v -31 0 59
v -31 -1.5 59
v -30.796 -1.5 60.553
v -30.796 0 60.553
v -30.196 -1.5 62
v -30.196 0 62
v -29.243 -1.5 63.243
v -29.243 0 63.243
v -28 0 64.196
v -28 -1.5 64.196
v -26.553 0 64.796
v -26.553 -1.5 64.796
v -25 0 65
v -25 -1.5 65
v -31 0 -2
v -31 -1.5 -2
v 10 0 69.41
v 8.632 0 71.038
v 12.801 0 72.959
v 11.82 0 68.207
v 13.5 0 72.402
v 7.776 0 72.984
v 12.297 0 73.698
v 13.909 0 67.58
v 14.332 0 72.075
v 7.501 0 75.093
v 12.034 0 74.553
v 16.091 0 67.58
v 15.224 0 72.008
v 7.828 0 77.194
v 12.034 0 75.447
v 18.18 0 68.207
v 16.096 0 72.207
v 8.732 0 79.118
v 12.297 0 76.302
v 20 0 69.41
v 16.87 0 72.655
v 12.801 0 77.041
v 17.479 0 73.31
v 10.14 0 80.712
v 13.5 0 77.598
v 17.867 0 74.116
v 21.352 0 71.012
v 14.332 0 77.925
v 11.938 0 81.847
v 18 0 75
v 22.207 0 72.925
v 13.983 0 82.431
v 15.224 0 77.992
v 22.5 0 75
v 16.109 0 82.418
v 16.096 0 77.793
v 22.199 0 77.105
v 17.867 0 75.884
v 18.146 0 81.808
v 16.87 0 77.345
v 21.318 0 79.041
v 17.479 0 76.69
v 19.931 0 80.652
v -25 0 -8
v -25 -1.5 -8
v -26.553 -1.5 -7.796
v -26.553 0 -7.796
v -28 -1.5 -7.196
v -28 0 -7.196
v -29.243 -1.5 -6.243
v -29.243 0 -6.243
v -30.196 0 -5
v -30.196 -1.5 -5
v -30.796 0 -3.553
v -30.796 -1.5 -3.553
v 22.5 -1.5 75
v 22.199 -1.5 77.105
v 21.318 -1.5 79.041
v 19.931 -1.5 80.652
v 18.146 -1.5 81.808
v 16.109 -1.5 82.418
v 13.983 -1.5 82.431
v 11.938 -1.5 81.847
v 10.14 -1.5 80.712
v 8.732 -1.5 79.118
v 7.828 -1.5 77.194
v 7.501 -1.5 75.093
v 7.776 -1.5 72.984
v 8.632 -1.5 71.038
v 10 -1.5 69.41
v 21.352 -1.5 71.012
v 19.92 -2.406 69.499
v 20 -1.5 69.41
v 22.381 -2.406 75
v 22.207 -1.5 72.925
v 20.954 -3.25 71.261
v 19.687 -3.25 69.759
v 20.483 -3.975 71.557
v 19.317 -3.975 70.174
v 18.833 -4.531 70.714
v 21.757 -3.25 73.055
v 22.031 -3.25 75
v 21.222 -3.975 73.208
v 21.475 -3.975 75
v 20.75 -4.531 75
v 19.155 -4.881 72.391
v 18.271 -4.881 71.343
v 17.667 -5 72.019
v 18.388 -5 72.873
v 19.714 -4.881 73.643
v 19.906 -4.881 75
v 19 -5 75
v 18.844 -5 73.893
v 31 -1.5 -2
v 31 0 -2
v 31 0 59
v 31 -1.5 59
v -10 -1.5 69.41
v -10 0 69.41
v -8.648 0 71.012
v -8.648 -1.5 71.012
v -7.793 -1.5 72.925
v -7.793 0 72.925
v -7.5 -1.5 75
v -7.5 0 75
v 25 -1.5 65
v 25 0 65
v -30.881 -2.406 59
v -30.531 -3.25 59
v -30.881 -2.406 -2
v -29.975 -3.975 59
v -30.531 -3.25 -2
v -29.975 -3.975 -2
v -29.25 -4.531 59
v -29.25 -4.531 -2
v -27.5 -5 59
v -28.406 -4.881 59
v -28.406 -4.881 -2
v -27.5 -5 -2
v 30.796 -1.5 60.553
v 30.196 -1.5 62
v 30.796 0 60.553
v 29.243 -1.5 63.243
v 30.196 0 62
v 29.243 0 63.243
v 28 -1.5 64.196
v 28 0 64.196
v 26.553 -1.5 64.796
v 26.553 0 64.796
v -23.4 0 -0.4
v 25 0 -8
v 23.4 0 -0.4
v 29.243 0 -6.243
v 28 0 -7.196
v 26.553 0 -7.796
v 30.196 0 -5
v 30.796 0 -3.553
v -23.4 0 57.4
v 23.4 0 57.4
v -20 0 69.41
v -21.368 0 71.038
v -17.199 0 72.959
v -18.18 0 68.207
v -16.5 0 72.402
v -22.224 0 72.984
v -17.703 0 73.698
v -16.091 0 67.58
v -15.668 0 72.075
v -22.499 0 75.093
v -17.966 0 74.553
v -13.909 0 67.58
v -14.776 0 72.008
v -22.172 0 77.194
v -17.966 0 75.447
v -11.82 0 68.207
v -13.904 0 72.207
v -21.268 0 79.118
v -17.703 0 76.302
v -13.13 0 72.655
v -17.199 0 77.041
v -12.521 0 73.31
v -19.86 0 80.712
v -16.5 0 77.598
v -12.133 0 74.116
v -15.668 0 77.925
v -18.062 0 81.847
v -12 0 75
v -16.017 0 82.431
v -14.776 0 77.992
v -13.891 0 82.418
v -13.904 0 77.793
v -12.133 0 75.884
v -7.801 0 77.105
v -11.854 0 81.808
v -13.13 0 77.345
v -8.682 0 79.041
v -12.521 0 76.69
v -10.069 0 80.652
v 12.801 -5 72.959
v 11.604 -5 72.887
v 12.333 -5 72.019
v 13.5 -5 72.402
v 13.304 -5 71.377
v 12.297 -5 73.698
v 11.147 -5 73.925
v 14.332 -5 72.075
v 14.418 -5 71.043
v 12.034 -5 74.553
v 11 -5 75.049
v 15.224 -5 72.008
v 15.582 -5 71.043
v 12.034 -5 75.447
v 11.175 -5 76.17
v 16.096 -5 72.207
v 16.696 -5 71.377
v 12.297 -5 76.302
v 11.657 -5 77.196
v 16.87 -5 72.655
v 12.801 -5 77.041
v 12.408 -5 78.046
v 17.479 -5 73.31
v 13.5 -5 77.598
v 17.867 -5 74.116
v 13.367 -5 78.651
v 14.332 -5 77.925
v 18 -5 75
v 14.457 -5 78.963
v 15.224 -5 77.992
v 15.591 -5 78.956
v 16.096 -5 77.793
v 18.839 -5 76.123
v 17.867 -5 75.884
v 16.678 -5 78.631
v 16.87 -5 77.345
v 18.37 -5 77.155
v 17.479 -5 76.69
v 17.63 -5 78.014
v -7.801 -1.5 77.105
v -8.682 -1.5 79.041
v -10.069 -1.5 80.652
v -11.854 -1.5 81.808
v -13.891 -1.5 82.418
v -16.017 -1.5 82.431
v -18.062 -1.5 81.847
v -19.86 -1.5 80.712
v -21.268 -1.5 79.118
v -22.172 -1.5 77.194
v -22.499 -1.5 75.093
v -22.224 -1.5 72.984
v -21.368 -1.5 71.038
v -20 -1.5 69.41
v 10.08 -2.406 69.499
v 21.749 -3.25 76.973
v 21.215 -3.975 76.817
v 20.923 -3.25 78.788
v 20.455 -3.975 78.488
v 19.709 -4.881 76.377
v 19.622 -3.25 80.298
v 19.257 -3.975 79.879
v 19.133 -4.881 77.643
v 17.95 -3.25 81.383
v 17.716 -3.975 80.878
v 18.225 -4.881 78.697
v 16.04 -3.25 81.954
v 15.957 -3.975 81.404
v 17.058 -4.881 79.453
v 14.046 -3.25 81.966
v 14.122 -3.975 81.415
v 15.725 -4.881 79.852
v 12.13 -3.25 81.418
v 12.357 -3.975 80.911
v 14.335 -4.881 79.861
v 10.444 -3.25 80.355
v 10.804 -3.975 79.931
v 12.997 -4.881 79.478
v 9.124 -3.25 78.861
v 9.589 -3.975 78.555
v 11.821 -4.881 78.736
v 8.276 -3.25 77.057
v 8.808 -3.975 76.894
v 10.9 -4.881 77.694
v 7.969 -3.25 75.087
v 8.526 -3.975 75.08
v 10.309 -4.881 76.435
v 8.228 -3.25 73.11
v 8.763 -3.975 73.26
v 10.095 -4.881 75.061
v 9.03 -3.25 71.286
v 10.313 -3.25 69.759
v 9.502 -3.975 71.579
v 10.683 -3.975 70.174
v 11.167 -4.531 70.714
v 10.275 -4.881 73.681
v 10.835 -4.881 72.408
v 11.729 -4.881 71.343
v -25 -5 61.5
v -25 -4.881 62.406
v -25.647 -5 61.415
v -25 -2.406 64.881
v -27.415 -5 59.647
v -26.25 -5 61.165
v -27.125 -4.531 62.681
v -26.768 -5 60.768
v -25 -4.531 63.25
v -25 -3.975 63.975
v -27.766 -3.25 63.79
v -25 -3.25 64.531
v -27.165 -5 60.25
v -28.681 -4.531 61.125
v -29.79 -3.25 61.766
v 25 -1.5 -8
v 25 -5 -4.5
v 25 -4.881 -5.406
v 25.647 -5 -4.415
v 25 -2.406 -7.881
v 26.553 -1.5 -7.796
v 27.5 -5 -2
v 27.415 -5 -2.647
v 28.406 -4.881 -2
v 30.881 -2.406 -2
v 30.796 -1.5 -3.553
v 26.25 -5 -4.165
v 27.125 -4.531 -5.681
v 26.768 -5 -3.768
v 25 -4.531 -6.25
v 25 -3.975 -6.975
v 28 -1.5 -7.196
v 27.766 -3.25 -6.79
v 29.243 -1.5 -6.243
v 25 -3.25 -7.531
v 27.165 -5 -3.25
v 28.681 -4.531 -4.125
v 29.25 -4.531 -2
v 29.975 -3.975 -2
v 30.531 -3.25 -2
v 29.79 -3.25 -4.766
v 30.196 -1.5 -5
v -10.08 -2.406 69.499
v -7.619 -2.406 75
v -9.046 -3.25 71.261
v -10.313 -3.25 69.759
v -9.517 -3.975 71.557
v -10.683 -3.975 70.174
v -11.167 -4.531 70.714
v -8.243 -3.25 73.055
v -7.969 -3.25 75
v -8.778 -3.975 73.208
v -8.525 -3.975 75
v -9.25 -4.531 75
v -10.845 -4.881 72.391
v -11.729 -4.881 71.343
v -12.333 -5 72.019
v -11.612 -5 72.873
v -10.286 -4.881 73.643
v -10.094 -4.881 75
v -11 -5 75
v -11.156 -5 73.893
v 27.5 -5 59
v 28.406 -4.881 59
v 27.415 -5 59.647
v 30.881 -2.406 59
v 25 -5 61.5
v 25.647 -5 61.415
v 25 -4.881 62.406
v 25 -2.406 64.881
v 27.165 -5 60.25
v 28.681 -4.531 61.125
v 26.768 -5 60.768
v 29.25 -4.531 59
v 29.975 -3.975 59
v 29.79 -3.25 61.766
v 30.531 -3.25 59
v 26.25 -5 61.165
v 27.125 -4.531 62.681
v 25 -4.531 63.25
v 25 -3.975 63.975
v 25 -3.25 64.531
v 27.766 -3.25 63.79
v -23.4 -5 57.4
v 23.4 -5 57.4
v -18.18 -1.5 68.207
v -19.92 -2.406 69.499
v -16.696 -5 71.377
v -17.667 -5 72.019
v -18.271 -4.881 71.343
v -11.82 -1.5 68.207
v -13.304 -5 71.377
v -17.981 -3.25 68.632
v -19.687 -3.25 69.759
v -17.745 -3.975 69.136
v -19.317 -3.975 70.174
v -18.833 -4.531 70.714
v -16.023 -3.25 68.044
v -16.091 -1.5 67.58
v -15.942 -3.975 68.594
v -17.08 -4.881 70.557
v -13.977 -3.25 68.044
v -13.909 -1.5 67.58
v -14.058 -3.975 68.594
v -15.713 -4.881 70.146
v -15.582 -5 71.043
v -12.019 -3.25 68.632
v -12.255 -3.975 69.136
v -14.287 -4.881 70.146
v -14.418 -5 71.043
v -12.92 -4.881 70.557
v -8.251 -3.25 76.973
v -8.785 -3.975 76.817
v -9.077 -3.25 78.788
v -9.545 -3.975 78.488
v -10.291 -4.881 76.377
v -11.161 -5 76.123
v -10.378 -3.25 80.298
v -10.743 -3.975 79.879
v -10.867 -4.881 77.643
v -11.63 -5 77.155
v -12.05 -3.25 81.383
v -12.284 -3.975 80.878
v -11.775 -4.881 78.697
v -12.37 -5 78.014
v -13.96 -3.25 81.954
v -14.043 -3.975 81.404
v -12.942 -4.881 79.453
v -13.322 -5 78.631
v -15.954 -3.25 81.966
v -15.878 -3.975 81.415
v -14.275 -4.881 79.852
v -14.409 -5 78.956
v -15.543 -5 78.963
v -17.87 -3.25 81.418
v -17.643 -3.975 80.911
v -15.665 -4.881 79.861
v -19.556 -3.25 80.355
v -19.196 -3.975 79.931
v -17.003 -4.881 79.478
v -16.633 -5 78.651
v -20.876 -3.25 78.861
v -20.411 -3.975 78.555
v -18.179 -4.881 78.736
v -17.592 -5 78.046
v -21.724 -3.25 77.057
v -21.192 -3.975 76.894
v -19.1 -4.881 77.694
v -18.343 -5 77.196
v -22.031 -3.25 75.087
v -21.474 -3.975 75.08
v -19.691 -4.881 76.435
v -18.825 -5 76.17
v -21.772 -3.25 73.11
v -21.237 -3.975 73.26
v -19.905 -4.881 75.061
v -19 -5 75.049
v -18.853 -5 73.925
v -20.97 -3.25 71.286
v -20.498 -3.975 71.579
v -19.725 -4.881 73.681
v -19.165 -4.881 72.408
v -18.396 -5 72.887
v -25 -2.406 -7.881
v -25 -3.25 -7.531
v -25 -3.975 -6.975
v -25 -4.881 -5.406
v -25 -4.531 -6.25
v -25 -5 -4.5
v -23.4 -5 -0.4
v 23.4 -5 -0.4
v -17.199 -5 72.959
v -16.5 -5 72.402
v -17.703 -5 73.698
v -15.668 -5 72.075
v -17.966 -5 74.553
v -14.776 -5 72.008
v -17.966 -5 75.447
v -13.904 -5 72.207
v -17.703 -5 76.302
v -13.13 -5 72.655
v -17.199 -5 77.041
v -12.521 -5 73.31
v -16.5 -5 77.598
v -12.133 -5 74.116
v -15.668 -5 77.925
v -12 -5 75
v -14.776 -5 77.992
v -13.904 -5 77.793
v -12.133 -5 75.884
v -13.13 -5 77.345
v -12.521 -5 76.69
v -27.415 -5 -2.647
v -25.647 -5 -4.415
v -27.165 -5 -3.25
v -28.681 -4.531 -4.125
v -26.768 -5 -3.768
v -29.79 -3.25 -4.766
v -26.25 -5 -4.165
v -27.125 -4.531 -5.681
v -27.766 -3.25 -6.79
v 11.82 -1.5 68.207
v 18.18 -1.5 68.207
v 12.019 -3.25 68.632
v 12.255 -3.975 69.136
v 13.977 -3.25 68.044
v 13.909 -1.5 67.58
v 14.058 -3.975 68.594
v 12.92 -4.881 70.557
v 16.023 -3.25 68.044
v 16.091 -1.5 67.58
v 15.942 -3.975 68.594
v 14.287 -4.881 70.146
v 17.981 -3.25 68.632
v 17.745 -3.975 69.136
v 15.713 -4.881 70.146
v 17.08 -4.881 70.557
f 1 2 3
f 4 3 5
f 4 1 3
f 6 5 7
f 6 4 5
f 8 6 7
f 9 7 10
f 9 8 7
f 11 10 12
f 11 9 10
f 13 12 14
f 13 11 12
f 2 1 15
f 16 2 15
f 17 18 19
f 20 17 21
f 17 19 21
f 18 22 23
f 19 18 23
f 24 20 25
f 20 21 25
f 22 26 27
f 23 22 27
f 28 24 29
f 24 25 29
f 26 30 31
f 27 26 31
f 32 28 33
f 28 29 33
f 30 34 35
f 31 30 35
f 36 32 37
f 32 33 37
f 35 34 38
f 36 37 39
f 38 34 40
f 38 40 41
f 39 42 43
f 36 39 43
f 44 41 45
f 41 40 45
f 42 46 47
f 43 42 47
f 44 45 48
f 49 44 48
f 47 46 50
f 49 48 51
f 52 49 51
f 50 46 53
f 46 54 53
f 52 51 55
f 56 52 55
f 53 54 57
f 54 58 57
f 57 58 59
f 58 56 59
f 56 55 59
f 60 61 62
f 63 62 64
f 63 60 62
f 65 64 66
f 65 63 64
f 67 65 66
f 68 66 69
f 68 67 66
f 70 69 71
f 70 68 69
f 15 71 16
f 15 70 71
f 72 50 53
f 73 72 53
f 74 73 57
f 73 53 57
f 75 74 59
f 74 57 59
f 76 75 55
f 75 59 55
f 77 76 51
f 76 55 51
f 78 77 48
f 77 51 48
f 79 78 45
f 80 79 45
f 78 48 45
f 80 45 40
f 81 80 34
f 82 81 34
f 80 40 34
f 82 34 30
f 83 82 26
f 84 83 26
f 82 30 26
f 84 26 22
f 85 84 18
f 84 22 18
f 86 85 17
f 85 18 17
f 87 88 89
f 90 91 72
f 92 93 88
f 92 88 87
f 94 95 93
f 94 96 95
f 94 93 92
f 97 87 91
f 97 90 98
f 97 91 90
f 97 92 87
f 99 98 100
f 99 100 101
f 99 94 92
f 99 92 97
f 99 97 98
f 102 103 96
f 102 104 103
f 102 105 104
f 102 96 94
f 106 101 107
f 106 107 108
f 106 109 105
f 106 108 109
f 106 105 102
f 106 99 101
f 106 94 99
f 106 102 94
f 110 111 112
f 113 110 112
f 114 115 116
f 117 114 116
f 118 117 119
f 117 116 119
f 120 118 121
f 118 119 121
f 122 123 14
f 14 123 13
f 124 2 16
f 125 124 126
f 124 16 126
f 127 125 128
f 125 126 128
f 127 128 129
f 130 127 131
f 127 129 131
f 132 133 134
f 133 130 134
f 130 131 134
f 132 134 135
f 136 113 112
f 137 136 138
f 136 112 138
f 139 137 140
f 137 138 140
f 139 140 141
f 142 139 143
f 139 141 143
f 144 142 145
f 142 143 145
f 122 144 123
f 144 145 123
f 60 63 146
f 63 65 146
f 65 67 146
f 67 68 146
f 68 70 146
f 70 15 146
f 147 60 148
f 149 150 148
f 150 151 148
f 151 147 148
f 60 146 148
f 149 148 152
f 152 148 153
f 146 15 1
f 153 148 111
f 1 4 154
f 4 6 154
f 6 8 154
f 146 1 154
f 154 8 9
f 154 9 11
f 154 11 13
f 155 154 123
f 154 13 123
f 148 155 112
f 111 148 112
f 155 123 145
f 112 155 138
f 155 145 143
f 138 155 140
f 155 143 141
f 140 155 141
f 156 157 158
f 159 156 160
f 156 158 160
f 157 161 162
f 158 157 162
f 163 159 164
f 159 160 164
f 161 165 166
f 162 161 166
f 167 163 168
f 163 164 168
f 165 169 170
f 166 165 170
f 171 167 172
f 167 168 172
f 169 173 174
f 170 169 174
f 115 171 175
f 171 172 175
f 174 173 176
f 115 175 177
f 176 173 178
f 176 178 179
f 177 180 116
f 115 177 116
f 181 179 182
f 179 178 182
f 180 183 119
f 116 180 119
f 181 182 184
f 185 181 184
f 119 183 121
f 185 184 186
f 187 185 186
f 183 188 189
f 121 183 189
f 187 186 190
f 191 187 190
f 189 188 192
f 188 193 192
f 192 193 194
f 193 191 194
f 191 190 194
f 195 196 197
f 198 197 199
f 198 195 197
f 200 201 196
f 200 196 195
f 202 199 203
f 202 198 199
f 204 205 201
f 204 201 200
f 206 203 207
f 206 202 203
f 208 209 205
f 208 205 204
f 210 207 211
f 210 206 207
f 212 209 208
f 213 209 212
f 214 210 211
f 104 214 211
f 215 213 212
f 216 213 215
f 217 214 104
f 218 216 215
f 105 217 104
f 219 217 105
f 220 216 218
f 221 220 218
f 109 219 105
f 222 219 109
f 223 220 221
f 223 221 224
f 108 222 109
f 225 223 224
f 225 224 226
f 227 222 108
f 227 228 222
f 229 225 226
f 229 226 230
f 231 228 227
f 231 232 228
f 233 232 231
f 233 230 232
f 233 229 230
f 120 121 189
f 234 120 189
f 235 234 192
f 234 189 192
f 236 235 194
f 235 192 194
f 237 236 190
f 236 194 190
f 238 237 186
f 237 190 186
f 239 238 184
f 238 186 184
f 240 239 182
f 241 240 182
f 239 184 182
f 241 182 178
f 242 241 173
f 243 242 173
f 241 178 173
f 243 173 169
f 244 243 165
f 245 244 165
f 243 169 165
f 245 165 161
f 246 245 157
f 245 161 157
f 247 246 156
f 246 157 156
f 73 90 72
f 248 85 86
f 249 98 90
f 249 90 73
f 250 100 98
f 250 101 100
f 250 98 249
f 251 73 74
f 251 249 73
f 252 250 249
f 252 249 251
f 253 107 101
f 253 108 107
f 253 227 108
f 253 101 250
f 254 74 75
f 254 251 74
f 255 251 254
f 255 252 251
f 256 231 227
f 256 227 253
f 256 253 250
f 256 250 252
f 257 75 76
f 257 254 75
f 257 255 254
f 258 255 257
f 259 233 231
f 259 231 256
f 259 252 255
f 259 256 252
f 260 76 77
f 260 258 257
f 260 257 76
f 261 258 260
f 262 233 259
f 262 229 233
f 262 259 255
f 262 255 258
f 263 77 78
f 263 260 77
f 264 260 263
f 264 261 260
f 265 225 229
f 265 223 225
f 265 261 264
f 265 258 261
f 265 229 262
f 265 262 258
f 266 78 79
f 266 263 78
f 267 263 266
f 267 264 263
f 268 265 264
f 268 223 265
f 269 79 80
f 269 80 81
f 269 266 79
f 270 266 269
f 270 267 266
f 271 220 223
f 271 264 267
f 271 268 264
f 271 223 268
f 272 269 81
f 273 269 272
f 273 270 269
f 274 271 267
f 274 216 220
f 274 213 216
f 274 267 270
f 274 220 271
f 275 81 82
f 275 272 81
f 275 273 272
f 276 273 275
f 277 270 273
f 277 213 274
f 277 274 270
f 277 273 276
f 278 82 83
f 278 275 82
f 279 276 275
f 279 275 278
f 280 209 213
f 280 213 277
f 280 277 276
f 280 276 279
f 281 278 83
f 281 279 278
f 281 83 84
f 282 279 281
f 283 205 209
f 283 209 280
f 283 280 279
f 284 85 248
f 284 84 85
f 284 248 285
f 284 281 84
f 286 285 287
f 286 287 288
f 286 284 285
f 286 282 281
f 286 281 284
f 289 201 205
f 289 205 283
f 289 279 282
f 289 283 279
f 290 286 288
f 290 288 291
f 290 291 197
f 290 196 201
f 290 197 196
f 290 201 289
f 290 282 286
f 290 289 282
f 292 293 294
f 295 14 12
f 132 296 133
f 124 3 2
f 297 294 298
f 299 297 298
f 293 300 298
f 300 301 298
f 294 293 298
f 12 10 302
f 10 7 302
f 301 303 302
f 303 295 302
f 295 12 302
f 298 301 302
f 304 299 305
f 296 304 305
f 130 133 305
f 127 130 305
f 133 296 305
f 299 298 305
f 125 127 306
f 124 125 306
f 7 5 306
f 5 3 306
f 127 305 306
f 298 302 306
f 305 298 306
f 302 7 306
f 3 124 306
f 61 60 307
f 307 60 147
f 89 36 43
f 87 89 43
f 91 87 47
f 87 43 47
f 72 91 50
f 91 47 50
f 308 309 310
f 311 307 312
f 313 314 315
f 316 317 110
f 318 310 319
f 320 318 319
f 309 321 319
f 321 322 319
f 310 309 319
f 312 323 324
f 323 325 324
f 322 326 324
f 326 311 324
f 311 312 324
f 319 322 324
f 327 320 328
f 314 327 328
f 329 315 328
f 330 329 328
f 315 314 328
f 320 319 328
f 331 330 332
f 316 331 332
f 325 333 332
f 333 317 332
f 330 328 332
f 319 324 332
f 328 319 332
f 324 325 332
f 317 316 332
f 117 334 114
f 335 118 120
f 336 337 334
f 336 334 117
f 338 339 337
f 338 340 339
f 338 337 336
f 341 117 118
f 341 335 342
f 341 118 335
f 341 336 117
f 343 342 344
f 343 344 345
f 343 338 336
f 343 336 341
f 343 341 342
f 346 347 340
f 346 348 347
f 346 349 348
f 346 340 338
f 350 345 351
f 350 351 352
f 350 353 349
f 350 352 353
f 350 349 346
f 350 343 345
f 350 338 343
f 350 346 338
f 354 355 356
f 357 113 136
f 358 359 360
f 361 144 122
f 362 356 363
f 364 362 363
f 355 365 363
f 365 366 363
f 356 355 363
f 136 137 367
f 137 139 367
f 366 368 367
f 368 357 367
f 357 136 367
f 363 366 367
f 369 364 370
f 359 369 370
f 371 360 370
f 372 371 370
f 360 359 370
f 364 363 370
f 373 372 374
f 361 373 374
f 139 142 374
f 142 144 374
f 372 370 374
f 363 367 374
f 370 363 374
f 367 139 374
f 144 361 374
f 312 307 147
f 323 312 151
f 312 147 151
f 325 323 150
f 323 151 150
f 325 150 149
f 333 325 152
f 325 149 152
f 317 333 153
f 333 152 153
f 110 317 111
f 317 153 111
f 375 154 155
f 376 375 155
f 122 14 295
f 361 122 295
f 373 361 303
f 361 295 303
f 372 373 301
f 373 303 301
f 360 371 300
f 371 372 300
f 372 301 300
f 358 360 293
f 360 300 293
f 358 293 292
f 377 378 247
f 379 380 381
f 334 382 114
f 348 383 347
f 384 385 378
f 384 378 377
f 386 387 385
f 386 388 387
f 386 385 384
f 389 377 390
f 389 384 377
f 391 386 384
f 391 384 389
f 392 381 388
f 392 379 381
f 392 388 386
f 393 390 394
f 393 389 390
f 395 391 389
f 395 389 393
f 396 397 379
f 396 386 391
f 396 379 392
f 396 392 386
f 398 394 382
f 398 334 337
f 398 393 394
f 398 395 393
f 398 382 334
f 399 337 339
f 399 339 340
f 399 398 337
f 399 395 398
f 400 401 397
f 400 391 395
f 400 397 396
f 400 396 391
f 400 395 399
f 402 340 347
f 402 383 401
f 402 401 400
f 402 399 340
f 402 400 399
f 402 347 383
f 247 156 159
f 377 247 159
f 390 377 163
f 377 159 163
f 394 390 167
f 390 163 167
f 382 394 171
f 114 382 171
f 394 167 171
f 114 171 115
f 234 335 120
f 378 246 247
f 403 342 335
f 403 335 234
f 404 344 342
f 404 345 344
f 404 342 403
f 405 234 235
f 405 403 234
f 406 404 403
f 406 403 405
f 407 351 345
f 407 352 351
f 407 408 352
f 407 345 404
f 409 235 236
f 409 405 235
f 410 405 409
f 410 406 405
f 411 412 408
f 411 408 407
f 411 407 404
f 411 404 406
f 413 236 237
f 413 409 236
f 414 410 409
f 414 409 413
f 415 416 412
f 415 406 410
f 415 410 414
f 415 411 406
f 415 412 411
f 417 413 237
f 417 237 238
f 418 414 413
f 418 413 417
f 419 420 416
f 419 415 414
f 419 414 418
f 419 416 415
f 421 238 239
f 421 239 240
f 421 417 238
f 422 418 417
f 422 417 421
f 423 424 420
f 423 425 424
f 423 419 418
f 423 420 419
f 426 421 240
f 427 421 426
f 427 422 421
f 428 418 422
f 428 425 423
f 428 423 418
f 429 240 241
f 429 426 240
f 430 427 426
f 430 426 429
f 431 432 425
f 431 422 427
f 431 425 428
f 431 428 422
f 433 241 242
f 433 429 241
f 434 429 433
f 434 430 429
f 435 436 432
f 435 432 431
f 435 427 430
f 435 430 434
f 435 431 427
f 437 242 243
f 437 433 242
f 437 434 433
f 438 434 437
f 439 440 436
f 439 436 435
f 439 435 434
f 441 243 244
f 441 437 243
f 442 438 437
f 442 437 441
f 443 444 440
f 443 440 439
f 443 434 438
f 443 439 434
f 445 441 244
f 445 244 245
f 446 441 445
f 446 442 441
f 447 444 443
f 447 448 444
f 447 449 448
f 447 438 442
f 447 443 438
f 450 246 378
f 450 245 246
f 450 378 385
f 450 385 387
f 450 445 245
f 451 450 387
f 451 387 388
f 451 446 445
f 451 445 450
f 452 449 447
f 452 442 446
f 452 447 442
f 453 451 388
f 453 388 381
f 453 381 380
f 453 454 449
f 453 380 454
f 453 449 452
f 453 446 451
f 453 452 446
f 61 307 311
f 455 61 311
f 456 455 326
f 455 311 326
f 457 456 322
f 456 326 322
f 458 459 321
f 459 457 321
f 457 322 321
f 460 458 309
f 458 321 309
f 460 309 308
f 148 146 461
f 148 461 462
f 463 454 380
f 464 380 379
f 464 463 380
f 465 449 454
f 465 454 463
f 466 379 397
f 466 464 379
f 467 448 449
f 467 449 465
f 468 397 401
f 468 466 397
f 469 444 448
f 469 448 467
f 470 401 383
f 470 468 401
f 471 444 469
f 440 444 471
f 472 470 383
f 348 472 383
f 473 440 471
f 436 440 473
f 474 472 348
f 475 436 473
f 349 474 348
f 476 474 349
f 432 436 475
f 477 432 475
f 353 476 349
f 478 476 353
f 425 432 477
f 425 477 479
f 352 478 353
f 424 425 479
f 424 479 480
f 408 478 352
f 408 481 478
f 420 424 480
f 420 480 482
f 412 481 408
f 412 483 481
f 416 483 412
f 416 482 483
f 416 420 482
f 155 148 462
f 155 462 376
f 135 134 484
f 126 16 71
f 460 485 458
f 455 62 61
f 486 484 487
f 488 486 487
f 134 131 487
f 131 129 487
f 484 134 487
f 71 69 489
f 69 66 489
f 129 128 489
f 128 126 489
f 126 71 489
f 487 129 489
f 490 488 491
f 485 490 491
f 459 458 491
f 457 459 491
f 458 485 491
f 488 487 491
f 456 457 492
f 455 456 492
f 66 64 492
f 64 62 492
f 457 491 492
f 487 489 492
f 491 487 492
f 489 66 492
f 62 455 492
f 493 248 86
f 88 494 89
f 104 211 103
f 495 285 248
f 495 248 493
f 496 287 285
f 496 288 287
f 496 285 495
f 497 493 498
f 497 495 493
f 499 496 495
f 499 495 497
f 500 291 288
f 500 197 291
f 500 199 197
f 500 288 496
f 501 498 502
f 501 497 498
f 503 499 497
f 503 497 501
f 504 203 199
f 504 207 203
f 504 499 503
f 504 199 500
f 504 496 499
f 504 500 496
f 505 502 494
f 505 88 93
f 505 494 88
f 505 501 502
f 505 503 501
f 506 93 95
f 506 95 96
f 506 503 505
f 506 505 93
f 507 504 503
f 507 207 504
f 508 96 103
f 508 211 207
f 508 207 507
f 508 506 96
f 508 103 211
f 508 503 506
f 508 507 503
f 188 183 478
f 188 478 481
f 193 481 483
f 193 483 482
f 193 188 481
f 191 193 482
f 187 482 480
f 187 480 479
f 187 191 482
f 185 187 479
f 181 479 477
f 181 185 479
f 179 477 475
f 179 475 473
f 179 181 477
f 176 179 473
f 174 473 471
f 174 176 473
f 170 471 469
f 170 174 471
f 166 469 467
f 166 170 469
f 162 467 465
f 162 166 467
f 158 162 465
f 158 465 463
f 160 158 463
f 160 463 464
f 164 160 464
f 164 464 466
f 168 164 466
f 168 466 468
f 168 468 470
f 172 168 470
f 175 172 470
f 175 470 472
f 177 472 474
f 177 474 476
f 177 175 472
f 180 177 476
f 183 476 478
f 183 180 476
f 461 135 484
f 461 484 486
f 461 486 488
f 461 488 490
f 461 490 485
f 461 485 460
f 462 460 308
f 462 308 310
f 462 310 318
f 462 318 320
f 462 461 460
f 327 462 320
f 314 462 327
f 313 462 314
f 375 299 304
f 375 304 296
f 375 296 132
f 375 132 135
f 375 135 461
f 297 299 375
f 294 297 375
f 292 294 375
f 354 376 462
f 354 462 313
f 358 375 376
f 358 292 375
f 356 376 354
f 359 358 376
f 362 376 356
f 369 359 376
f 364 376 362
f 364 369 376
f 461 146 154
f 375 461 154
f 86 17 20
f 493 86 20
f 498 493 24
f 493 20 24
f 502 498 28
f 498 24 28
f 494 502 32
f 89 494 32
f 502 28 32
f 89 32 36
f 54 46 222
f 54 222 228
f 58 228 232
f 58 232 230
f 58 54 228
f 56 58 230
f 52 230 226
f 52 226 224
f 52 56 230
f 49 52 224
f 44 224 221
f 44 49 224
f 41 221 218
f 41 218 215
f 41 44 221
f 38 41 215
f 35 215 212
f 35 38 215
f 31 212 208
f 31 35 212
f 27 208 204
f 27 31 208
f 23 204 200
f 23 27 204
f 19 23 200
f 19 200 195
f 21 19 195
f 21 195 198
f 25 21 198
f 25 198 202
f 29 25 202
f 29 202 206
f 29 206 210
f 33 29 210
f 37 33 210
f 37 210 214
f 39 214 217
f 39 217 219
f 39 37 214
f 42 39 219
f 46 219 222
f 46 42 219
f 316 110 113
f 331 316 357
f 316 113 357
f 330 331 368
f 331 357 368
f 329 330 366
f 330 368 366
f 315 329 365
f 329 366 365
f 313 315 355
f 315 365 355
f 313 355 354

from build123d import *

# Parameters (mm, degrees)
F5_W         = 46
F5_H         = 57
F0_DEPTH     = 5
F5_R         = 3
F2_R         = 3.5
F2_2_R       = 3.5
F2_3_R       = 3.5
F3_T1_DEPTH  = 20
F3_T4_ANGLE  = 90
F3_T6_ANGLE  = 90
F3_T8_ANGLE  = 90
F3_T10_ANGLE = 90
F6_R         = 1.5
F7_W         = 46.8
F7_H         = 57.8
F7_W_2       = 46
F7_H_2       = 57
F4_DEPTH     = 5


# Not quite as in the source:
# - a fillet or chamfer that OpenCascade refuses, or shapes differently, is made with other operations: its cross-section is extruded or revolved along the edge and cut away or added
# - a feature of the source that left no trace in its solid (it failed there, or was rolled back) is left out
# - a feature names something its author has since deleted; it is built from what else it names


with BuildPart() as f0:
    # F5 (on Front) → F0 (new body)
    with BuildSketch(Plane.XZ):
        Polygon((-31, -8), (31, -8), (31, 65), (20, 65), (15.5901699437, 65), (15, 65), (10, 65), (5.5901699437, 65), (0, 65), (-5.5901699437, 65), (-10, 65), (-15, 65), (-15.5901699437, 65), (-20, 65), (-31, 65), align=None)
        with Locations((0, 28.5)):
            Rectangle(F5_W, F5_H, mode=Mode.SUBTRACT)
    extrude(amount=F0_DEPTH)

    # F2
    f2_edges = [f0.edges().sort_by_distance(p)[0] for p in [
        (31, -5, 28.5),
        (0, -5, 65),
        (-31, -5, 28.5),
        (0, -5, -8),
    ]]
    fillet(f2_edges, radius=F2_R)

    # F3: fillet of radius 6 on 4 edges, made by hand

    # F3_s2 → F3_t1 (cut)
    with BuildSketch(Plane.XZ.offset(-15)):
        with BuildLine():
            ThreePointArc((-25, -8), (-29.2426406871, -6.2426406871), (-31, -2))
            Line((-31, -2), (-31, -8))
            Line((-31, -8), (-25, -8))
        make_face()
        with BuildLine():
            ThreePointArc((-31, 59), (-29.2426406871, 63.2426406871), (-25, 65))
            Line((-25, 65), (-31, 65))
            Line((-31, 65), (-31, 59))
        make_face()
        with BuildLine():
            ThreePointArc((31, 59), (29.2426406871, 63.2426406871), (25, 65))
            Line((25, 65), (31, 65))
            Line((31, 65), (31, 59))
        make_face()
        with BuildLine():
            ThreePointArc((25, -8), (29.2426406871, -6.2426406871), (31, -2))
            Line((31, -2), (31, -8))
            Line((31, -8), (25, -8))
        make_face()
    extrude(amount=F3_T1_DEPTH, mode=Mode.SUBTRACT)

    # F3_s3 → F3_t4 (revolve, cut)
    with BuildSketch(Plane.YZ.offset(25)):
        with BuildLine():
            ThreePointArc((-5, -4.5), (-3.9748737342, -6.9748737342), (-1.5, -8))
            Line((-1.5, -8), (-5, -8))
            Line((-5, -8), (-5, -4.5))
        make_face()
    revolve(axis=Axis((25, -5, -2), (0, -1, 0)), revolution_arc=F3_T4_ANGLE, mode=Mode.SUBTRACT)

    # F3_s5 → F3_t6 (revolve, cut)
    with BuildSketch(Plane.XY.offset(59)):
        with BuildLine():
            ThreePointArc((27.5, -5), (29.9748737342, -3.9748737342), (31, -1.5))
            Line((31, -1.5), (31, -5))
            Line((31, -5), (27.5, -5))
        make_face()
    revolve(axis=Axis((25, -5, 59), (0, -1, 0)), revolution_arc=F3_T6_ANGLE, mode=Mode.SUBTRACT)

    # F3_s7 → F3_t8 (revolve, cut)
    with BuildSketch(Plane.YZ.offset(-25)):
        with BuildLine():
            ThreePointArc((-5, 61.5), (-3.9748737342, 63.9748737342), (-1.5, 65))
            Line((-1.5, 65), (-5, 65))
            Line((-5, 65), (-5, 61.5))
        make_face()
    revolve(axis=Axis((-25, -5, 59), (0, -1, 0)), revolution_arc=F3_T8_ANGLE, mode=Mode.SUBTRACT)

    # F3_s9 → F3_t10 (revolve, cut)
    with BuildSketch(Plane.XY.offset(-2)):
        with BuildLine():
            ThreePointArc((-27.5, -5), (-29.9748737342, -3.9748737342), (-31, -1.5))
            Line((-31, -1.5), (-31, -5))
            Line((-31, -5), (-27.5, -5))
        make_face()
    revolve(axis=Axis((-25, -5, -2), (0, -1, 0)), revolution_arc=F3_T10_ANGLE, mode=Mode.SUBTRACT)

    # F6
    f6_edges = [f0.edges().sort_by_distance(p)[0] for p in [
        (-23, -2.5, 57),
        (23, -2.5, 57),
        (23, -2.5, 0),
        (-23, -2.5, 0),
    ]]
    fillet(f6_edges, radius=F6_R)

    # F7 (on face) → F4 (cut, through all)
    with BuildSketch(Plane.XZ):
        with Locations((0, 28.5)):
            Rectangle(F7_W, F7_H)
        with Locations((0, 28.5)):
            Rectangle(F7_W_2, F7_H_2, mode=Mode.SUBTRACT)
        with Locations((0, 28.5)):
            Rectangle(F7_W_2, F7_H_2)
    extrude(amount=F4_DEPTH, mode=Mode.SUBTRACT)


with BuildPart() as f0b:
    # F5 (on Front) → F0, piece 2 (new body)
    with BuildSketch(Plane.XZ):
        with BuildLine():
            Line((10, 69.4098300563), (20, 69.4098300563))
            ThreePointArc((20, 69.4098300563), (21.8465319688, 71.9381378215), (22.5, 75))
            ThreePointArc((22.5, 75), (11.9381378215, 81.8465319688), (10, 69.4098300563))
        make_face()
        with Locations((15, 75)):
            Circle(F5_R, mode=Mode.SUBTRACT)
        with BuildLine():
            ThreePointArc((10, 69.4098300563), (15, 67.5), (20, 69.4098300563))
            Line((20, 69.4098300563), (10, 69.4098300563))
        make_face()
    extrude(amount=F0_DEPTH)

    # F2#2
    f2_2_edges = [f0b.edges().sort_by_distance(p)[0] for p in [
        (7.5, -5, 75),
    ]]
    fillet(f2_2_edges, radius=F2_2_R)


with BuildPart() as f0c:
    # F5 (on Front) → F0, piece 3 (new body)
    with BuildSketch(Plane.XZ):
        with BuildLine():
            Line((-10, 69.4098300563), (-20, 69.4098300563))
            ThreePointArc((-20, 69.4098300563), (-15, 67.5), (-10, 69.4098300563))
        make_face()
        with BuildLine():
            ThreePointArc((-7.5, 75), (-18.0618621785, 81.8465319688), (-20, 69.4098300563))
            Line((-20, 69.4098300563), (-10, 69.4098300563))
            ThreePointArc((-10, 69.4098300563), (-8.1534680312, 71.9381378215), (-7.5, 75))
        make_face()
        with Locations((-15, 75)):
            Circle(F5_R, mode=Mode.SUBTRACT)
    extrude(amount=F0_DEPTH)

    # F2#3
    f2_3_edges = [f0c.edges().sort_by_distance(p)[0] for p in [
        (-20, -5, 80.59017),
    ]]
    fillet(f2_3_edges, radius=F2_3_R)


solid = Compound([f0.part, f0b.part, f0c.part])
